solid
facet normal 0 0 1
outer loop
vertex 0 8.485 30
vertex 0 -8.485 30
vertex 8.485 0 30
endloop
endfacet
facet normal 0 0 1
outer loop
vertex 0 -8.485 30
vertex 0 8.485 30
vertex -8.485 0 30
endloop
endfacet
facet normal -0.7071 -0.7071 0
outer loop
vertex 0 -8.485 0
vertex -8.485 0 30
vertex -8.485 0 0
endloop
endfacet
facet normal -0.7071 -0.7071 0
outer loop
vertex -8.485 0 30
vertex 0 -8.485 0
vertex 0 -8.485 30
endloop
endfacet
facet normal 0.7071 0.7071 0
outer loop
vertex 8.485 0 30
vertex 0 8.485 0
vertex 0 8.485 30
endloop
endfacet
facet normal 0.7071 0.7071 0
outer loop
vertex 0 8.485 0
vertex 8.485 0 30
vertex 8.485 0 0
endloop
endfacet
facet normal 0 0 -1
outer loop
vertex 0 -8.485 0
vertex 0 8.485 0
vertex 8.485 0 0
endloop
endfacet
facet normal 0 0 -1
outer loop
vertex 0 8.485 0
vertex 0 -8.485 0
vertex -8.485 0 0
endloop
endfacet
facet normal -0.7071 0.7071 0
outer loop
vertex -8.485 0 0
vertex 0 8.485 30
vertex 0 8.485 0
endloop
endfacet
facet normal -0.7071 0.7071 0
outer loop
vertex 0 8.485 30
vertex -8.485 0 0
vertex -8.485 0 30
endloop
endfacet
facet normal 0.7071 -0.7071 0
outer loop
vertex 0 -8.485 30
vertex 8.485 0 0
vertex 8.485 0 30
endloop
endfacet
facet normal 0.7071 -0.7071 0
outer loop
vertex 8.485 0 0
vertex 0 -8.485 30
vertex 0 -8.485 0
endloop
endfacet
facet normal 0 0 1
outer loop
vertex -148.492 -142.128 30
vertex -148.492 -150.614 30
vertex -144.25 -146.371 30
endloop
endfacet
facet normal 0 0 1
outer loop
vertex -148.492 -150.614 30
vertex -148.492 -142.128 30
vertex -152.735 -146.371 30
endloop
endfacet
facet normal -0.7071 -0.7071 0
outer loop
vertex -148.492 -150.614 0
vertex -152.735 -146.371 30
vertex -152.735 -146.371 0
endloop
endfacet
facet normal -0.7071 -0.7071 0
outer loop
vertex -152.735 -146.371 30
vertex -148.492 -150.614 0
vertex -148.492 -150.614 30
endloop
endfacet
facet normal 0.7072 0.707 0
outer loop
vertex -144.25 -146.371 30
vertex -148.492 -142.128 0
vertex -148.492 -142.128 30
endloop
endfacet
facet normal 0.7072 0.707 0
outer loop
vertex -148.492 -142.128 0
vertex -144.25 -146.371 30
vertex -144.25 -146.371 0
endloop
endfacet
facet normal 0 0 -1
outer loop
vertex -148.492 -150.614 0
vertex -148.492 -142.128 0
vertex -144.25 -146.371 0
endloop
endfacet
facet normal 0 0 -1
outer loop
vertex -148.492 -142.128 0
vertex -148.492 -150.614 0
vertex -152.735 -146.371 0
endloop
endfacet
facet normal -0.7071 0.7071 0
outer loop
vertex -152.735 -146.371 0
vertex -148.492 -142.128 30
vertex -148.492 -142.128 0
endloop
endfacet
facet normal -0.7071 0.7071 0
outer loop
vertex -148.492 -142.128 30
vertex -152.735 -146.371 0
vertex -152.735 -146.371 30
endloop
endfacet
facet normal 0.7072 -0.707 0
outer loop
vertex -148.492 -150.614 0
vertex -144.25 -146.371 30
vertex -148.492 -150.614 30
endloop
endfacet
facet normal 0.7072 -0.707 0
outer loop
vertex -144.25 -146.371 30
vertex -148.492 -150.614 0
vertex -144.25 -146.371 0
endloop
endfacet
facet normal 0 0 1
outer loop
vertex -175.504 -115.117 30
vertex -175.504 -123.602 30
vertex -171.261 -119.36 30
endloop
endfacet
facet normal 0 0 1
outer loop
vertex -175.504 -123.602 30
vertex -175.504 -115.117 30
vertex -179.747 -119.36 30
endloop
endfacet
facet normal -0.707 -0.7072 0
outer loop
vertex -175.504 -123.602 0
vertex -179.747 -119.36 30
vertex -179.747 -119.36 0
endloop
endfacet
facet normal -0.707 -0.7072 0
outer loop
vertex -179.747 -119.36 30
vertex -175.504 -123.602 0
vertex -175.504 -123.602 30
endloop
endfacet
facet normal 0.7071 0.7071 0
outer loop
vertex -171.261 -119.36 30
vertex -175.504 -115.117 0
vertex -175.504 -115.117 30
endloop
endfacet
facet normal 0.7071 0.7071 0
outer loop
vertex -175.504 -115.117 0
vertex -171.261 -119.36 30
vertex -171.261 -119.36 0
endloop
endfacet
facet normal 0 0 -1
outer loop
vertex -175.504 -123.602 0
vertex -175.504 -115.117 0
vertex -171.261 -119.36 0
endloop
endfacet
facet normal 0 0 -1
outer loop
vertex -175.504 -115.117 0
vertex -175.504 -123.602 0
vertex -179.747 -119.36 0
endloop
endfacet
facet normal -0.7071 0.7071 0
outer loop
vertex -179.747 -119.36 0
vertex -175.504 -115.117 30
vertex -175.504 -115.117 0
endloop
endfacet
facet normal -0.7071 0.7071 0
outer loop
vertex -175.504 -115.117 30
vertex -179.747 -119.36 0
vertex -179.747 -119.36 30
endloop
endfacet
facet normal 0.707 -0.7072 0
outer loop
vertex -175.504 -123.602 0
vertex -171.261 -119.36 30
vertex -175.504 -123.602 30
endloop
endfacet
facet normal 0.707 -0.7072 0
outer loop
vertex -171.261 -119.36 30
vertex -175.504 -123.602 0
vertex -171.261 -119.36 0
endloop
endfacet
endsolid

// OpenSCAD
//General
$fn=6;
tolerance = 0.2;

// Door
l_door = 30;
w_door = 35+tolerance;
h_door = 210;

// Bracket
wall_bracket =  3;
l_bracket = l_door;
h_bracket = h_door;
w_bracket = w_door+wall_bracket*2;

// Hook for door
h_backhook = 40;

// Hook for whiteboard
wall_hook = 1;
l_hook = l_bracket;
h_hook = 18;
space_hook = 2; // width of whiteboard's plastic w_doore're hooking into
n_hook_support = 4;

wall_modifier = wall_bracket*2;
l_modifier = l_bracket;

rotate([45,-90,0]){
  // body();
  // mirror([0,1,0])
  // wbHook();
  color("red")
  cornerModifiers();
}

module body(){
  difference(){
    // bracket
    cube([l_bracket, w_bracket, h_bracket]);
    // door (inside space)
    translate([0,wall_bracket,-wall_bracket])
    cube([l_door, w_door, h_door]);
    // hook
    translate([0,wall_bracket*2,-h_backhook])
    cube([l_door, w_door, h_door]);
  }
}

module wbHook(){
  translate([0, space_hook, 0])
  cube([l_hook, wall_hook, h_hook]);
  translate([0,-wall_bracket,(1-n_hook_support)*wall_bracket])
  cube([l_hook,space_hook+wall_bracket+wall_hook, wall_bracket*3]);
}

module cornerModifiers(){
  // WB hook
  translate([0,-wall_bracket*2,-wall_bracket*2])
  cube([l_modifier,  wall_modifier*2, wall_modifier*2]);
  // Door hook corners
  translate([0,-wall_bracket*0.5,h_bracket-wall_bracket*1.5])
  cube([l_modifier,  wall_modifier, wall_modifier]);
  translate([0,w_door+wall_bracket*0.5,h_bracket-wall_bracket*1.5])
  cube([l_modifier,  wall_modifier, wall_modifier]);
}
